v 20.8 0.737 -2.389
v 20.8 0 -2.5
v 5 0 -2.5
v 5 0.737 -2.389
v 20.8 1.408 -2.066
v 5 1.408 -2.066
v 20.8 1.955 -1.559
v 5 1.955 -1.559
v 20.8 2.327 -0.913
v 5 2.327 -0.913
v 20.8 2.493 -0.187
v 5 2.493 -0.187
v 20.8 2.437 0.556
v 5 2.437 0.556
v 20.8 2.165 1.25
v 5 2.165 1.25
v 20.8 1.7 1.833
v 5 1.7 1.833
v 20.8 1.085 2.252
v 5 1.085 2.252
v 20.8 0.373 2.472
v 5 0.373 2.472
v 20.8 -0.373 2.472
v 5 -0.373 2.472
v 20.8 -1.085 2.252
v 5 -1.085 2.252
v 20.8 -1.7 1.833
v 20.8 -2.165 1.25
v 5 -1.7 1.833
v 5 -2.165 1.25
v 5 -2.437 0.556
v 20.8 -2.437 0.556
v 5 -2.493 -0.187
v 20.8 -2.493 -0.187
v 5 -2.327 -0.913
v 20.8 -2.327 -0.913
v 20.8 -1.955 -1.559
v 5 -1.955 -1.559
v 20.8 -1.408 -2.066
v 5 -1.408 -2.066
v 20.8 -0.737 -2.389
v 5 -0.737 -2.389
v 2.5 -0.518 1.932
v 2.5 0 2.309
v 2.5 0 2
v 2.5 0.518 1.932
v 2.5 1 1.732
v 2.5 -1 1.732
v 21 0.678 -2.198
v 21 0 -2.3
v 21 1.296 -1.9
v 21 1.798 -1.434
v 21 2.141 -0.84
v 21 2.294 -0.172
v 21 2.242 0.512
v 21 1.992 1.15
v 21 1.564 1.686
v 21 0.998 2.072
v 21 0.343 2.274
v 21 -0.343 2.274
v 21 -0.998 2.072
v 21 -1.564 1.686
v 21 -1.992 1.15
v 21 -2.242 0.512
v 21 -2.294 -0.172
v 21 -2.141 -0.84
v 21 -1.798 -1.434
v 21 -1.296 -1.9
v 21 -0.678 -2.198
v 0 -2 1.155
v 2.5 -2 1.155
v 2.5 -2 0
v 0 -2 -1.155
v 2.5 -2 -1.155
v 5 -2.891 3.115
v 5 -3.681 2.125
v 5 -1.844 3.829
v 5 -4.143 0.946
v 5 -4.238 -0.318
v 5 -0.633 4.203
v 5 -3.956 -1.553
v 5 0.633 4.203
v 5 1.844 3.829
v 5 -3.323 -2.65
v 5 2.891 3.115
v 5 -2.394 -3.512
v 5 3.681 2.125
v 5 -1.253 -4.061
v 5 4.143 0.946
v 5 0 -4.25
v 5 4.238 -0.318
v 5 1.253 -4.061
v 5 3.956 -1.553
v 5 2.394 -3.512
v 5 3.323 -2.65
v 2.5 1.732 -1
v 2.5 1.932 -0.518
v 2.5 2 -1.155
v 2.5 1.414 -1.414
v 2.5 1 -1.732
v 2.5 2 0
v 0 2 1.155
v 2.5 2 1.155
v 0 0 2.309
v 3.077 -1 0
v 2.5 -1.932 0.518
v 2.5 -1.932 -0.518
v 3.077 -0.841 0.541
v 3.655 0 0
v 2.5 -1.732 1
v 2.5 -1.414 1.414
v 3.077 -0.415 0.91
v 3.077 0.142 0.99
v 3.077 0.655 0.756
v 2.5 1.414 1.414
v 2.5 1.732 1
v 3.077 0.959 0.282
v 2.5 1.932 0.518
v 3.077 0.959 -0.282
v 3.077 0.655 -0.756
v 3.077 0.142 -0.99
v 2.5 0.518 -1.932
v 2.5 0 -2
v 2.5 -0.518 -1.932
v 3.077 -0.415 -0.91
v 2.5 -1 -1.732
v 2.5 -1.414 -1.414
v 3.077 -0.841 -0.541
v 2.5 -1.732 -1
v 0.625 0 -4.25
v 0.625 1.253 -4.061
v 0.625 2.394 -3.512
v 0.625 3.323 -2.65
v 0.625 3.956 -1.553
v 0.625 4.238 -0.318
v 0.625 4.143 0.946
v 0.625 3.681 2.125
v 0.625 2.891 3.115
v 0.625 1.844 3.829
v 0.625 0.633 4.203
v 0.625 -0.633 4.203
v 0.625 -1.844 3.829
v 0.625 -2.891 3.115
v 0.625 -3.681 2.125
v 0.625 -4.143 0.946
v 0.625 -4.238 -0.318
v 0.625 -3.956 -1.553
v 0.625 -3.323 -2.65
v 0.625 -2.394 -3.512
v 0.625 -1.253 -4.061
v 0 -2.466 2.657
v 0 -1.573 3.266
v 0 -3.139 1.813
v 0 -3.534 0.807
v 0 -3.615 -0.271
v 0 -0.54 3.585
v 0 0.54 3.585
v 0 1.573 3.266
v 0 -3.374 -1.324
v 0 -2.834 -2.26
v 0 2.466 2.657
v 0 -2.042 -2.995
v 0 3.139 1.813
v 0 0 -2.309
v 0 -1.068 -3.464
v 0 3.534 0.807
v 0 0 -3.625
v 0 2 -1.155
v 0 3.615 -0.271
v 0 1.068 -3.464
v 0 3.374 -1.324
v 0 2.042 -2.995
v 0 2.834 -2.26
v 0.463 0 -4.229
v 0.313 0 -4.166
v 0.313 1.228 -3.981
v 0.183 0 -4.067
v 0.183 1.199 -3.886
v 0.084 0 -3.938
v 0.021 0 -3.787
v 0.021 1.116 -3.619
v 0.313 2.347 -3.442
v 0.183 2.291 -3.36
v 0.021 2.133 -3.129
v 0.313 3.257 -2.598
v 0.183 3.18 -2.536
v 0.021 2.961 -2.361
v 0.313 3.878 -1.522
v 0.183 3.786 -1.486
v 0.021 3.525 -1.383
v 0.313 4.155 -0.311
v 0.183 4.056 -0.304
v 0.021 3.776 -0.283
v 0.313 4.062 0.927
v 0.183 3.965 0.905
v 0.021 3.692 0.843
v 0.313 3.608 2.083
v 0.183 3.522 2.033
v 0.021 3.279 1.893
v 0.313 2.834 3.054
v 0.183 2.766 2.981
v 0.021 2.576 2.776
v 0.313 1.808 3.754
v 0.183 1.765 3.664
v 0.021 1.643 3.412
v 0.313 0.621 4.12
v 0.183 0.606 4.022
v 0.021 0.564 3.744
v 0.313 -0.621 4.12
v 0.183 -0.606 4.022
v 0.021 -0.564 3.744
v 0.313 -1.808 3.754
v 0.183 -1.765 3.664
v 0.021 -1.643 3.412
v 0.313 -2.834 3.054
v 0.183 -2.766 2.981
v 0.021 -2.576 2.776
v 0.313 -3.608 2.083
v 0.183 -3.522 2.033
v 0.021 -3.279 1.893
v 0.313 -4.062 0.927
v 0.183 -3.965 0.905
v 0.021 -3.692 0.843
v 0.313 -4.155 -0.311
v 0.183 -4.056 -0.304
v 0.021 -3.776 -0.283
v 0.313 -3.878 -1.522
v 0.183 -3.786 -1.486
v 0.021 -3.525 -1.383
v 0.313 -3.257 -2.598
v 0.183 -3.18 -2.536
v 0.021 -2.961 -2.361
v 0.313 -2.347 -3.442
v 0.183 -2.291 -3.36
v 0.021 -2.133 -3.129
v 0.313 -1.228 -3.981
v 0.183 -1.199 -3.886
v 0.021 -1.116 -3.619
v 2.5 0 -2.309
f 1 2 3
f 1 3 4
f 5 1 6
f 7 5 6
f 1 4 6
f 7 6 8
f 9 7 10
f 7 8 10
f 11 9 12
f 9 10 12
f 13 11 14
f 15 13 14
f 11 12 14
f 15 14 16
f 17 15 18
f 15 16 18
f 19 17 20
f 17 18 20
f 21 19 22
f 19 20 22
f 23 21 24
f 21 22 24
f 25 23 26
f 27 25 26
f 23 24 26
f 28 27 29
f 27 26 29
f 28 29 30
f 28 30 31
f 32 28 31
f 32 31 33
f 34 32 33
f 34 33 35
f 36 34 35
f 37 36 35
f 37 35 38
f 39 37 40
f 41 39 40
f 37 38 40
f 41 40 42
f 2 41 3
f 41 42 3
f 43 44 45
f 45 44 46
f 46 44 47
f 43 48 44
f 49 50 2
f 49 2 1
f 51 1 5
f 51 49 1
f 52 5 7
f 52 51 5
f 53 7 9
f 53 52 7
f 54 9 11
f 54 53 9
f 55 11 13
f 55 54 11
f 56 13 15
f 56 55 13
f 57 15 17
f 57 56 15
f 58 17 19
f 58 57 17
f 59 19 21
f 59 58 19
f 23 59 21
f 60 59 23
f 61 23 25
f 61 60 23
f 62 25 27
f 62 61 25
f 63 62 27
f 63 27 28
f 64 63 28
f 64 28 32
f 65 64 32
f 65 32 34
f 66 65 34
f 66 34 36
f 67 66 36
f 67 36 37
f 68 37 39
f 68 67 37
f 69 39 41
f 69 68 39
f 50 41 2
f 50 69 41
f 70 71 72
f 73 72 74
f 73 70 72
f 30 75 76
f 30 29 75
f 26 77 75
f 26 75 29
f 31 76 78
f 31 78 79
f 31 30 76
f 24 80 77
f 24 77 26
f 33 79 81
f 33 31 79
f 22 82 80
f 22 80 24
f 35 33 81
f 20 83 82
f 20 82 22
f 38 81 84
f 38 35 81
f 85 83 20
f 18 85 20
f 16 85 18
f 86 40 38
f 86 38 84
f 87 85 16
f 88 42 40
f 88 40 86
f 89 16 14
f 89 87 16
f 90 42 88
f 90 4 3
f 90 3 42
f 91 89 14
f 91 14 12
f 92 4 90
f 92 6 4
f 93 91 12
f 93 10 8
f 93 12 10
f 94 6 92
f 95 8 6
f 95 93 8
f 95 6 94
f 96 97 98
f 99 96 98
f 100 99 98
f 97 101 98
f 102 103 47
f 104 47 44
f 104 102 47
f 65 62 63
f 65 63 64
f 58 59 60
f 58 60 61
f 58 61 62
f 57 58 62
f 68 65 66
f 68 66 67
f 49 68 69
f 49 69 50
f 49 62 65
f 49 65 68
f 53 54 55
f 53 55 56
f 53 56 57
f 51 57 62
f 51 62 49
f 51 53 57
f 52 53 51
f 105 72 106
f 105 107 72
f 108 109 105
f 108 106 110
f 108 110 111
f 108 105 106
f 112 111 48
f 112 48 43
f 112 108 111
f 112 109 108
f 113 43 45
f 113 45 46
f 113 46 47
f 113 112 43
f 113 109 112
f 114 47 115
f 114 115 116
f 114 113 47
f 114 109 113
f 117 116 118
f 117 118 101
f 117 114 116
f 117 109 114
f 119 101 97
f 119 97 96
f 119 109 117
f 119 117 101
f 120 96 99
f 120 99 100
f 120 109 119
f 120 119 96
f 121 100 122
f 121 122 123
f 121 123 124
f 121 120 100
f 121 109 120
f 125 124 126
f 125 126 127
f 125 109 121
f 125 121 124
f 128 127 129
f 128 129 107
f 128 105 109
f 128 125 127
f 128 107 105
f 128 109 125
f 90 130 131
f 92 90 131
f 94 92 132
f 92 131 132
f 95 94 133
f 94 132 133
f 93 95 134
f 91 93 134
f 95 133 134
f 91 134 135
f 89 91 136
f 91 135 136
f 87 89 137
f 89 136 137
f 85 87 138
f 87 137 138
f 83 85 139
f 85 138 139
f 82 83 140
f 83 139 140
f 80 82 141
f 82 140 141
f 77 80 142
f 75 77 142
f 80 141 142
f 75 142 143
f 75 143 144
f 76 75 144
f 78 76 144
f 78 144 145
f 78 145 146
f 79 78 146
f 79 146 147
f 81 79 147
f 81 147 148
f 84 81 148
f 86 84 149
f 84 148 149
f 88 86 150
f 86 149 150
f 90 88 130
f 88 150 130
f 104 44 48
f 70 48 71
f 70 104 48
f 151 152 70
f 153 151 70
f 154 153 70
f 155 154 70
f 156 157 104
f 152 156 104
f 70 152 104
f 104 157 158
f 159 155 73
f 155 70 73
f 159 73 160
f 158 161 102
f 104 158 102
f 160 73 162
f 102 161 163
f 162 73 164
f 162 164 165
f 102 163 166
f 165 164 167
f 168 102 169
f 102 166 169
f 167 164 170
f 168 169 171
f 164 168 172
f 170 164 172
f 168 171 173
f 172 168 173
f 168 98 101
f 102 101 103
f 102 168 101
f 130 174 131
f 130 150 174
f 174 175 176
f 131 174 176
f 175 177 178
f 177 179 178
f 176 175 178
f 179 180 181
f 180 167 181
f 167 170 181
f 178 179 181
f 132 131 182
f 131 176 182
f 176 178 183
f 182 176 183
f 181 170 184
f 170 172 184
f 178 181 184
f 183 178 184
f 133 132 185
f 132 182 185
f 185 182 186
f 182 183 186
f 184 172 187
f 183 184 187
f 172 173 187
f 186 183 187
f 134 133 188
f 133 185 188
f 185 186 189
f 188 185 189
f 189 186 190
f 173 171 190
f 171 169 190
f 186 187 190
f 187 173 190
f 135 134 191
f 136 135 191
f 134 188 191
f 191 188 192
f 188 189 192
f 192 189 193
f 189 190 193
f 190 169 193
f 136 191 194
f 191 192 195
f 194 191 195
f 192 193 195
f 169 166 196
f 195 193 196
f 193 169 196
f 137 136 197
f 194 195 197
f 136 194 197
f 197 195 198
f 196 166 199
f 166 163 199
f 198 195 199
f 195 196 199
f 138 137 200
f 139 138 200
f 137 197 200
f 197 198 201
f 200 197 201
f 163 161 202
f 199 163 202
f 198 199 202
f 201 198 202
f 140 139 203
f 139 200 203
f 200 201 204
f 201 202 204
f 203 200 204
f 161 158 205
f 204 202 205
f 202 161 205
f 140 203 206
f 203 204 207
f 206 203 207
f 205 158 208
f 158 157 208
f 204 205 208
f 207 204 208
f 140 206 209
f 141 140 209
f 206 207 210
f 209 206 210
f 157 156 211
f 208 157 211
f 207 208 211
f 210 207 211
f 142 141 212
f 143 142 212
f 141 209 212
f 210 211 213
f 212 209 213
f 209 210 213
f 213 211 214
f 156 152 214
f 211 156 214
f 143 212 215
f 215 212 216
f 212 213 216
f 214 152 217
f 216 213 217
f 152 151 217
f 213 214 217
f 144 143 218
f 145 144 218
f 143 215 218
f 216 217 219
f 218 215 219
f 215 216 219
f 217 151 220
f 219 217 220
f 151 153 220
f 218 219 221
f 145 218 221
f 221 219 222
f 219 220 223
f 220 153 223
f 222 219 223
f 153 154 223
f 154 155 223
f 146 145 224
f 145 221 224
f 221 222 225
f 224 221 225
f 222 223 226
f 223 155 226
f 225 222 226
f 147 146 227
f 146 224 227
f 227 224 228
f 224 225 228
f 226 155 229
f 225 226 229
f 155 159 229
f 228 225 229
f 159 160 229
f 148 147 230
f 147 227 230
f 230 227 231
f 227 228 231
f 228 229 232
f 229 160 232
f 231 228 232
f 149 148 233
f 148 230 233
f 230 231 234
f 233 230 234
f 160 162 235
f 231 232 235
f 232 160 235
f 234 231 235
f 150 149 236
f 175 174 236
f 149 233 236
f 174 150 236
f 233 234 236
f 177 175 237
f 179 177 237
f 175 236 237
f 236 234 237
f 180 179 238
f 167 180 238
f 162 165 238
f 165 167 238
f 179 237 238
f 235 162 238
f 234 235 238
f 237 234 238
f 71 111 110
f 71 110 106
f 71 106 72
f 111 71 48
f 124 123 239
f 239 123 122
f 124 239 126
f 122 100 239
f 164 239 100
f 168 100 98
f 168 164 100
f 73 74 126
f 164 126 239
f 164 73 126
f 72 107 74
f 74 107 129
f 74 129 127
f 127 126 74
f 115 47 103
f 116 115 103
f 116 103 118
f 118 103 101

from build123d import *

# Parameters (mm, degrees)
SKETCH1_R           = 4.25
BASEHEAD_DEPTH      = 5
SKETCH2_R           = 2.5
BASEBODY_DEPTH      = 16
HEXAGONSOCKET_DEPTH = 2.5
TOPFILLET_R         = 0.625
CHAMFER1_SIZE       = 0.2


with BuildPart() as part:
    # Sketch1 → BaseHead (new body)
    with BuildSketch(Plane(origin=(0, 0, 0), x_dir=(0, 0, -1), z_dir=(1, 0, 0))):
        Circle(SKETCH1_R)
    extrude(amount=BASEHEAD_DEPTH)

    # Sketch2 → BaseBody (add)
    with BuildSketch(Plane(origin=(5, 0, 0), x_dir=(0, 0, -1), z_dir=(1, 0, 0))):
        Circle(SKETCH2_R)
    extrude(amount=BASEBODY_DEPTH)

    # Sketch3 → HexagonSocket (cut)
    with BuildSketch(Plane(origin=(0, 0, 0), x_dir=(0, 0, -1), z_dir=(1, 0, 0))):
        Polygon((2.309401077, 0), (1.154700538, 2), (-1.154700538, 2), (-2.309401077, 0), (-1.154700538, -2), (1.154700538, -2), align=None)
    extrude(amount=HEXAGONSOCKET_DEPTH, mode=Mode.SUBTRACT)

    # Sketch4 → Cut-Revolve1 (revolve, cut)
    with BuildSketch(Plane(origin=(-4.19613823, 0.75, 0), x_dir=(-1, 0, 0), z_dir=(0, 0, 1))):
        Polygon((-6.69613823, 2.75), (-7.850838768, 0.75), (-6.69613823, 0.75), align=None)
    revolve(axis=Axis((0.838992387, 0, 0), (-1, 0, 0)), mode=Mode.SUBTRACT)

    # TopFillet
    topfillet_edges = [part.edges().sort_by_distance(p)[0] for p in [
        (0, 0, 4.25),
    ]]
    fillet(topfillet_edges, radius=TOPFILLET_R)

    # Chamfer1
    chamfer1_edges = [part.edges().sort_by_distance(p)[0] for p in [
        (21, 0, 2.5),
    ]]
    chamfer(chamfer1_edges, length=CHAMFER1_SIZE)


solid = part.part
